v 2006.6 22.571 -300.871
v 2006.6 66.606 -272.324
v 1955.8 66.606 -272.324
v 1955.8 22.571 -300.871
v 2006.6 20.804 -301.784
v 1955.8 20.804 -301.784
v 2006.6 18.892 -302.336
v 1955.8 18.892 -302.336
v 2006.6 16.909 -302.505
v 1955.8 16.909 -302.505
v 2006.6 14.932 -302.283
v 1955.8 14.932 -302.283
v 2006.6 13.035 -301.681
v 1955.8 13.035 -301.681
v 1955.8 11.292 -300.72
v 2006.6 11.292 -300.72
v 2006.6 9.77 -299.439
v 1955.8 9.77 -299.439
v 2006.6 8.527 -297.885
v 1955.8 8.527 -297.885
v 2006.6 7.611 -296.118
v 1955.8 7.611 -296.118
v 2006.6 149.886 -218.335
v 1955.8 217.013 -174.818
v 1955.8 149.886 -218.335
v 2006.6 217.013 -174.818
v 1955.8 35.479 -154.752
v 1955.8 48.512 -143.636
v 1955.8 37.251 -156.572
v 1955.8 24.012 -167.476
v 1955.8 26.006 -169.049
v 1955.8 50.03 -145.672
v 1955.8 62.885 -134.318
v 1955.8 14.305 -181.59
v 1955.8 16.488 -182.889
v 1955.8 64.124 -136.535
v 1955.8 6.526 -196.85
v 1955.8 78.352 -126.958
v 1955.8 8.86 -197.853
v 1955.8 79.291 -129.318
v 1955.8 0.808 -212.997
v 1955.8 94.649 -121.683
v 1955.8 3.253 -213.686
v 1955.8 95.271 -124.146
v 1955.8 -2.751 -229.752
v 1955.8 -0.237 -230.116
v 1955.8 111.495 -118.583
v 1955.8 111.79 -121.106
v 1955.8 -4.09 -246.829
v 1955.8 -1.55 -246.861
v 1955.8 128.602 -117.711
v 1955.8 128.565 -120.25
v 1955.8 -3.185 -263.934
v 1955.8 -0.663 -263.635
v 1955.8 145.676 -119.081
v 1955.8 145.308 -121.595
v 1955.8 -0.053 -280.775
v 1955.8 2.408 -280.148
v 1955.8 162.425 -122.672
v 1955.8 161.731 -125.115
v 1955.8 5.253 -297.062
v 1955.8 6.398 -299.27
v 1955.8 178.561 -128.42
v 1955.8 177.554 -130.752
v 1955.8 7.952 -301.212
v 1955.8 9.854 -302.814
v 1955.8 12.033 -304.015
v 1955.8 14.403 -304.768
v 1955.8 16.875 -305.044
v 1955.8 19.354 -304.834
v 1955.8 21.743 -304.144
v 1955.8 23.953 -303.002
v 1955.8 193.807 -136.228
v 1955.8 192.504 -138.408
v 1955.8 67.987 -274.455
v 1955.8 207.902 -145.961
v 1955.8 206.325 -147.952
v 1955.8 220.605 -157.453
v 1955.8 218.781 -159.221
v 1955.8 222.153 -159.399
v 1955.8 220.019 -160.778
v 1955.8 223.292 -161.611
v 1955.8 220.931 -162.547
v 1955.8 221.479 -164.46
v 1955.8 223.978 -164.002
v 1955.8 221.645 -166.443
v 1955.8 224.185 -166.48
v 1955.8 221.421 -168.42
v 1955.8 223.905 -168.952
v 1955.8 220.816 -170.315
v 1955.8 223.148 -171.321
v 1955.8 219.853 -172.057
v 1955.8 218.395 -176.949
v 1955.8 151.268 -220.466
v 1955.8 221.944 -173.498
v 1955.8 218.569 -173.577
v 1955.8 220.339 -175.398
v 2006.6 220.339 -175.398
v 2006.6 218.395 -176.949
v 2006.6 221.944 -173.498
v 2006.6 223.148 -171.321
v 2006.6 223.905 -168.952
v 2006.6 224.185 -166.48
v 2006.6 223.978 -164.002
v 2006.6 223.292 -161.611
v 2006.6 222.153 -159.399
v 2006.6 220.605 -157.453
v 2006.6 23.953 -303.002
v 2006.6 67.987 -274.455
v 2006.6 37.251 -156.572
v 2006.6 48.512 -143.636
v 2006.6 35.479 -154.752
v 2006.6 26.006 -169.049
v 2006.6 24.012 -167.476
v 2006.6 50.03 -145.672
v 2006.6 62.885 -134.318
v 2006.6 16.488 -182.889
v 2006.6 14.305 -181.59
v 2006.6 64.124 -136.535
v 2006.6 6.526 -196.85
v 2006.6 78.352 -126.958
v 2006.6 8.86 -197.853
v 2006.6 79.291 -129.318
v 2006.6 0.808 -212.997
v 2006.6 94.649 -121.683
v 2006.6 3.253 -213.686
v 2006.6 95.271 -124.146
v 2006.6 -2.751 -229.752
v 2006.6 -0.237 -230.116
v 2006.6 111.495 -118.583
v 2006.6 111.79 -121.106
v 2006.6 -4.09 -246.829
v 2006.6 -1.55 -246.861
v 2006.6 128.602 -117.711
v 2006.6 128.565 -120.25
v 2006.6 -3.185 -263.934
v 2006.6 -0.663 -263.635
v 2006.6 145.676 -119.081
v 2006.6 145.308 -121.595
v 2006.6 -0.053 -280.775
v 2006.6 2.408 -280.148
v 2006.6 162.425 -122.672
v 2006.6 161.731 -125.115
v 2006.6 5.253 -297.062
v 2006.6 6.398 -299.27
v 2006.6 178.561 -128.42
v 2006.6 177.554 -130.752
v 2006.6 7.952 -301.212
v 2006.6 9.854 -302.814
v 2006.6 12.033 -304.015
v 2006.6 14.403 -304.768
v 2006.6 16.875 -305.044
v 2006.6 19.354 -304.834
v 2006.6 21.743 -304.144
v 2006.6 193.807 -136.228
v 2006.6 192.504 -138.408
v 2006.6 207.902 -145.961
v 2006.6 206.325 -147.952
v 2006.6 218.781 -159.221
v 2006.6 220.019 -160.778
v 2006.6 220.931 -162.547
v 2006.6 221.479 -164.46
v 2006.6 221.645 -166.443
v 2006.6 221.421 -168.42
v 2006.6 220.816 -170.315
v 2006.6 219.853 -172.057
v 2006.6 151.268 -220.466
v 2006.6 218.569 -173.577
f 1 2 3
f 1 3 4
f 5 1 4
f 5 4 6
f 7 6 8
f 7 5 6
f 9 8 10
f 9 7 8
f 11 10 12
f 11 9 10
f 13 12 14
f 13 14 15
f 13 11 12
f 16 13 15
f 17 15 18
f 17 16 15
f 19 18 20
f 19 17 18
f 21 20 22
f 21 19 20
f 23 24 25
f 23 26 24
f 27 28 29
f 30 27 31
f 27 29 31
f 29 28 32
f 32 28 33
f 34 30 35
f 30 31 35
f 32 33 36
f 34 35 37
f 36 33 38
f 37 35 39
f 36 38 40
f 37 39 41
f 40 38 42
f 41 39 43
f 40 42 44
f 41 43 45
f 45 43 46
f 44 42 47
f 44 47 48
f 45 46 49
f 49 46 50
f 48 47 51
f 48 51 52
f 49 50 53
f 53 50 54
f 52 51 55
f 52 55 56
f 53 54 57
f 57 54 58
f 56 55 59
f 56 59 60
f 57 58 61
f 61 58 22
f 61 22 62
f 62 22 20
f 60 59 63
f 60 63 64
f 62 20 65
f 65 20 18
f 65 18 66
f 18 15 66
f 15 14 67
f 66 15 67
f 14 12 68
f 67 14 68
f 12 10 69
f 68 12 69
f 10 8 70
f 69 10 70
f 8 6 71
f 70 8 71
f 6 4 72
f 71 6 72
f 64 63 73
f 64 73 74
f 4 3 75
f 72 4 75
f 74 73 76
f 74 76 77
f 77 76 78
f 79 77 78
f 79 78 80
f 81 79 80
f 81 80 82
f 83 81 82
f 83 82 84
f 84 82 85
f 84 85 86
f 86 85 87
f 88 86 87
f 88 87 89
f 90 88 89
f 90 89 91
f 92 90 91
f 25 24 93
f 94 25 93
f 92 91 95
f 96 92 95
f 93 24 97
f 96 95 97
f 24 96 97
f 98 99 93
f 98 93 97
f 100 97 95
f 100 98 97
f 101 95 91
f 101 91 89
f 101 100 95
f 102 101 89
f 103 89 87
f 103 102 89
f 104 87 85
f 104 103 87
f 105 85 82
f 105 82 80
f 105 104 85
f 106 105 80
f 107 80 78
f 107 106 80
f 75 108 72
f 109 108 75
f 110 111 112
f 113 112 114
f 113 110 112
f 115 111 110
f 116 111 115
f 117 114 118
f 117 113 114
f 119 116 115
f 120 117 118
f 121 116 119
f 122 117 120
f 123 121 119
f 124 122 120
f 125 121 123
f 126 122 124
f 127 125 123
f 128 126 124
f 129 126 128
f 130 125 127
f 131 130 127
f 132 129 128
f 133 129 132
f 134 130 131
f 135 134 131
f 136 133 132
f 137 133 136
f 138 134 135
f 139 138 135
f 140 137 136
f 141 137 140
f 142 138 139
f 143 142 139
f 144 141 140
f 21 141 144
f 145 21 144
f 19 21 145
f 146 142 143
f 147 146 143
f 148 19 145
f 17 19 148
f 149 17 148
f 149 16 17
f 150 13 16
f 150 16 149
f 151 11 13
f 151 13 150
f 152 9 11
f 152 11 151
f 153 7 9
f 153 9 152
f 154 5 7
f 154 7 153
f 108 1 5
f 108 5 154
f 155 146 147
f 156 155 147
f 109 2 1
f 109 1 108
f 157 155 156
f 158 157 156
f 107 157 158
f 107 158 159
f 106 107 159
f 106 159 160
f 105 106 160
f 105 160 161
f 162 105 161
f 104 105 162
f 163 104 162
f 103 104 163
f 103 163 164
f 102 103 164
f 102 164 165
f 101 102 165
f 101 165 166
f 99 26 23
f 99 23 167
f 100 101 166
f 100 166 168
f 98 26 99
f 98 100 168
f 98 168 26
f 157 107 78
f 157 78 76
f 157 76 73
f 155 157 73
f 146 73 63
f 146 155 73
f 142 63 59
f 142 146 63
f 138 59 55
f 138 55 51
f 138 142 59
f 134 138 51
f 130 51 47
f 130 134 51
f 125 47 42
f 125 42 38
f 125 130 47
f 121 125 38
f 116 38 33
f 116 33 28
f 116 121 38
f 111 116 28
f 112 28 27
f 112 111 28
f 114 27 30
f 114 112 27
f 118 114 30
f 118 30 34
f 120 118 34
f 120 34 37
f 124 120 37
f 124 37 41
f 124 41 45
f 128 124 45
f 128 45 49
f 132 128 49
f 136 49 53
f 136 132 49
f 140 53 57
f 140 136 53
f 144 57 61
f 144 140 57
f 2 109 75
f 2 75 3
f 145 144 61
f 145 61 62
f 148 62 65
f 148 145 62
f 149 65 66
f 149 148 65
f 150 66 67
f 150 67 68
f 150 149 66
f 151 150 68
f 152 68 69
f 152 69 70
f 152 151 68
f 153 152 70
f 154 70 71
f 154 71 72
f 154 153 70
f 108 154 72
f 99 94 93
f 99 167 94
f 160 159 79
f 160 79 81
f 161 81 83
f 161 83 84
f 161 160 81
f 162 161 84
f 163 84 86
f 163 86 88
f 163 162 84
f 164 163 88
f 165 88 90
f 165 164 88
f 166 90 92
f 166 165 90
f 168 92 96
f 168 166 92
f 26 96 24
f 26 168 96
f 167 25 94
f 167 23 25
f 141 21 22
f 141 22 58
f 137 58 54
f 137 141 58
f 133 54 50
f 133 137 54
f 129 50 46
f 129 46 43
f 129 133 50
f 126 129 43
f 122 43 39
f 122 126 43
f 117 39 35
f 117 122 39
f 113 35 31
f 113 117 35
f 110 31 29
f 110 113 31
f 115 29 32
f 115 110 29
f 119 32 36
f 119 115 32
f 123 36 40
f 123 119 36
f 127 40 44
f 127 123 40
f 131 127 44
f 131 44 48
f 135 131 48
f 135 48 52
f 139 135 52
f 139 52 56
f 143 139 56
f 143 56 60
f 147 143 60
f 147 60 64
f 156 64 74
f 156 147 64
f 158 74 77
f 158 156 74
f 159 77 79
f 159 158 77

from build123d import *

# Parameters (mm, degrees)
EXTRUDE_THIN1_DEPTH = 25.4


with BuildPart() as part:
    # Sketch2 → Extrude-Thin1 (new body, symmetric)
    with BuildSketch(Plane(origin=(1981.2, 0, 0), x_dir=(0, 0, -1), z_dir=(1, 0, 0))):
        with BuildLine():
            Line((220.466063539, 151.267804305), (176.948936788, 218.39459013))
            ThreePointArc((176.948936788, 218.39459013), (167.722867176, 224.105285456), (157.452600901, 220.60470947))
            ThreePointArc((157.452600901, 220.60470947), (138.741359143, 55.545453365), (297.061605662, 5.252629462))
            ThreePointArc((297.061605662, 5.252629462), (304.44942683, 13.199484184), (303.002052812, 23.952972457))
            Line((303.002052812, 23.952972457), (274.455306754, 67.987389518))
            Line((274.455306754, 67.987389518), (272.32398896, 66.605693293))
            Line((272.32398896, 66.605693293), (300.870735018, 22.571276232))
            ThreePointArc((300.870735018, 22.571276232), (302.028634232, 13.968485614), (296.118377298, 7.611001836))
            ThreePointArc((296.118377298, 7.611001836), (140.872676937, 56.927149591), (159.220550284, 218.780989377))
            ThreePointArc((159.220550284, 218.780989377), (167.436763304, 221.581450166), (174.817618993, 217.012893905))
            Line((174.817618993, 217.012893905), (218.334745745, 149.88610808))
            Line((218.334745745, 149.88610808), (220.466063539, 151.267804305))
        make_face()
    extrude(amount=EXTRUDE_THIN1_DEPTH, both=True)


solid = part.part
